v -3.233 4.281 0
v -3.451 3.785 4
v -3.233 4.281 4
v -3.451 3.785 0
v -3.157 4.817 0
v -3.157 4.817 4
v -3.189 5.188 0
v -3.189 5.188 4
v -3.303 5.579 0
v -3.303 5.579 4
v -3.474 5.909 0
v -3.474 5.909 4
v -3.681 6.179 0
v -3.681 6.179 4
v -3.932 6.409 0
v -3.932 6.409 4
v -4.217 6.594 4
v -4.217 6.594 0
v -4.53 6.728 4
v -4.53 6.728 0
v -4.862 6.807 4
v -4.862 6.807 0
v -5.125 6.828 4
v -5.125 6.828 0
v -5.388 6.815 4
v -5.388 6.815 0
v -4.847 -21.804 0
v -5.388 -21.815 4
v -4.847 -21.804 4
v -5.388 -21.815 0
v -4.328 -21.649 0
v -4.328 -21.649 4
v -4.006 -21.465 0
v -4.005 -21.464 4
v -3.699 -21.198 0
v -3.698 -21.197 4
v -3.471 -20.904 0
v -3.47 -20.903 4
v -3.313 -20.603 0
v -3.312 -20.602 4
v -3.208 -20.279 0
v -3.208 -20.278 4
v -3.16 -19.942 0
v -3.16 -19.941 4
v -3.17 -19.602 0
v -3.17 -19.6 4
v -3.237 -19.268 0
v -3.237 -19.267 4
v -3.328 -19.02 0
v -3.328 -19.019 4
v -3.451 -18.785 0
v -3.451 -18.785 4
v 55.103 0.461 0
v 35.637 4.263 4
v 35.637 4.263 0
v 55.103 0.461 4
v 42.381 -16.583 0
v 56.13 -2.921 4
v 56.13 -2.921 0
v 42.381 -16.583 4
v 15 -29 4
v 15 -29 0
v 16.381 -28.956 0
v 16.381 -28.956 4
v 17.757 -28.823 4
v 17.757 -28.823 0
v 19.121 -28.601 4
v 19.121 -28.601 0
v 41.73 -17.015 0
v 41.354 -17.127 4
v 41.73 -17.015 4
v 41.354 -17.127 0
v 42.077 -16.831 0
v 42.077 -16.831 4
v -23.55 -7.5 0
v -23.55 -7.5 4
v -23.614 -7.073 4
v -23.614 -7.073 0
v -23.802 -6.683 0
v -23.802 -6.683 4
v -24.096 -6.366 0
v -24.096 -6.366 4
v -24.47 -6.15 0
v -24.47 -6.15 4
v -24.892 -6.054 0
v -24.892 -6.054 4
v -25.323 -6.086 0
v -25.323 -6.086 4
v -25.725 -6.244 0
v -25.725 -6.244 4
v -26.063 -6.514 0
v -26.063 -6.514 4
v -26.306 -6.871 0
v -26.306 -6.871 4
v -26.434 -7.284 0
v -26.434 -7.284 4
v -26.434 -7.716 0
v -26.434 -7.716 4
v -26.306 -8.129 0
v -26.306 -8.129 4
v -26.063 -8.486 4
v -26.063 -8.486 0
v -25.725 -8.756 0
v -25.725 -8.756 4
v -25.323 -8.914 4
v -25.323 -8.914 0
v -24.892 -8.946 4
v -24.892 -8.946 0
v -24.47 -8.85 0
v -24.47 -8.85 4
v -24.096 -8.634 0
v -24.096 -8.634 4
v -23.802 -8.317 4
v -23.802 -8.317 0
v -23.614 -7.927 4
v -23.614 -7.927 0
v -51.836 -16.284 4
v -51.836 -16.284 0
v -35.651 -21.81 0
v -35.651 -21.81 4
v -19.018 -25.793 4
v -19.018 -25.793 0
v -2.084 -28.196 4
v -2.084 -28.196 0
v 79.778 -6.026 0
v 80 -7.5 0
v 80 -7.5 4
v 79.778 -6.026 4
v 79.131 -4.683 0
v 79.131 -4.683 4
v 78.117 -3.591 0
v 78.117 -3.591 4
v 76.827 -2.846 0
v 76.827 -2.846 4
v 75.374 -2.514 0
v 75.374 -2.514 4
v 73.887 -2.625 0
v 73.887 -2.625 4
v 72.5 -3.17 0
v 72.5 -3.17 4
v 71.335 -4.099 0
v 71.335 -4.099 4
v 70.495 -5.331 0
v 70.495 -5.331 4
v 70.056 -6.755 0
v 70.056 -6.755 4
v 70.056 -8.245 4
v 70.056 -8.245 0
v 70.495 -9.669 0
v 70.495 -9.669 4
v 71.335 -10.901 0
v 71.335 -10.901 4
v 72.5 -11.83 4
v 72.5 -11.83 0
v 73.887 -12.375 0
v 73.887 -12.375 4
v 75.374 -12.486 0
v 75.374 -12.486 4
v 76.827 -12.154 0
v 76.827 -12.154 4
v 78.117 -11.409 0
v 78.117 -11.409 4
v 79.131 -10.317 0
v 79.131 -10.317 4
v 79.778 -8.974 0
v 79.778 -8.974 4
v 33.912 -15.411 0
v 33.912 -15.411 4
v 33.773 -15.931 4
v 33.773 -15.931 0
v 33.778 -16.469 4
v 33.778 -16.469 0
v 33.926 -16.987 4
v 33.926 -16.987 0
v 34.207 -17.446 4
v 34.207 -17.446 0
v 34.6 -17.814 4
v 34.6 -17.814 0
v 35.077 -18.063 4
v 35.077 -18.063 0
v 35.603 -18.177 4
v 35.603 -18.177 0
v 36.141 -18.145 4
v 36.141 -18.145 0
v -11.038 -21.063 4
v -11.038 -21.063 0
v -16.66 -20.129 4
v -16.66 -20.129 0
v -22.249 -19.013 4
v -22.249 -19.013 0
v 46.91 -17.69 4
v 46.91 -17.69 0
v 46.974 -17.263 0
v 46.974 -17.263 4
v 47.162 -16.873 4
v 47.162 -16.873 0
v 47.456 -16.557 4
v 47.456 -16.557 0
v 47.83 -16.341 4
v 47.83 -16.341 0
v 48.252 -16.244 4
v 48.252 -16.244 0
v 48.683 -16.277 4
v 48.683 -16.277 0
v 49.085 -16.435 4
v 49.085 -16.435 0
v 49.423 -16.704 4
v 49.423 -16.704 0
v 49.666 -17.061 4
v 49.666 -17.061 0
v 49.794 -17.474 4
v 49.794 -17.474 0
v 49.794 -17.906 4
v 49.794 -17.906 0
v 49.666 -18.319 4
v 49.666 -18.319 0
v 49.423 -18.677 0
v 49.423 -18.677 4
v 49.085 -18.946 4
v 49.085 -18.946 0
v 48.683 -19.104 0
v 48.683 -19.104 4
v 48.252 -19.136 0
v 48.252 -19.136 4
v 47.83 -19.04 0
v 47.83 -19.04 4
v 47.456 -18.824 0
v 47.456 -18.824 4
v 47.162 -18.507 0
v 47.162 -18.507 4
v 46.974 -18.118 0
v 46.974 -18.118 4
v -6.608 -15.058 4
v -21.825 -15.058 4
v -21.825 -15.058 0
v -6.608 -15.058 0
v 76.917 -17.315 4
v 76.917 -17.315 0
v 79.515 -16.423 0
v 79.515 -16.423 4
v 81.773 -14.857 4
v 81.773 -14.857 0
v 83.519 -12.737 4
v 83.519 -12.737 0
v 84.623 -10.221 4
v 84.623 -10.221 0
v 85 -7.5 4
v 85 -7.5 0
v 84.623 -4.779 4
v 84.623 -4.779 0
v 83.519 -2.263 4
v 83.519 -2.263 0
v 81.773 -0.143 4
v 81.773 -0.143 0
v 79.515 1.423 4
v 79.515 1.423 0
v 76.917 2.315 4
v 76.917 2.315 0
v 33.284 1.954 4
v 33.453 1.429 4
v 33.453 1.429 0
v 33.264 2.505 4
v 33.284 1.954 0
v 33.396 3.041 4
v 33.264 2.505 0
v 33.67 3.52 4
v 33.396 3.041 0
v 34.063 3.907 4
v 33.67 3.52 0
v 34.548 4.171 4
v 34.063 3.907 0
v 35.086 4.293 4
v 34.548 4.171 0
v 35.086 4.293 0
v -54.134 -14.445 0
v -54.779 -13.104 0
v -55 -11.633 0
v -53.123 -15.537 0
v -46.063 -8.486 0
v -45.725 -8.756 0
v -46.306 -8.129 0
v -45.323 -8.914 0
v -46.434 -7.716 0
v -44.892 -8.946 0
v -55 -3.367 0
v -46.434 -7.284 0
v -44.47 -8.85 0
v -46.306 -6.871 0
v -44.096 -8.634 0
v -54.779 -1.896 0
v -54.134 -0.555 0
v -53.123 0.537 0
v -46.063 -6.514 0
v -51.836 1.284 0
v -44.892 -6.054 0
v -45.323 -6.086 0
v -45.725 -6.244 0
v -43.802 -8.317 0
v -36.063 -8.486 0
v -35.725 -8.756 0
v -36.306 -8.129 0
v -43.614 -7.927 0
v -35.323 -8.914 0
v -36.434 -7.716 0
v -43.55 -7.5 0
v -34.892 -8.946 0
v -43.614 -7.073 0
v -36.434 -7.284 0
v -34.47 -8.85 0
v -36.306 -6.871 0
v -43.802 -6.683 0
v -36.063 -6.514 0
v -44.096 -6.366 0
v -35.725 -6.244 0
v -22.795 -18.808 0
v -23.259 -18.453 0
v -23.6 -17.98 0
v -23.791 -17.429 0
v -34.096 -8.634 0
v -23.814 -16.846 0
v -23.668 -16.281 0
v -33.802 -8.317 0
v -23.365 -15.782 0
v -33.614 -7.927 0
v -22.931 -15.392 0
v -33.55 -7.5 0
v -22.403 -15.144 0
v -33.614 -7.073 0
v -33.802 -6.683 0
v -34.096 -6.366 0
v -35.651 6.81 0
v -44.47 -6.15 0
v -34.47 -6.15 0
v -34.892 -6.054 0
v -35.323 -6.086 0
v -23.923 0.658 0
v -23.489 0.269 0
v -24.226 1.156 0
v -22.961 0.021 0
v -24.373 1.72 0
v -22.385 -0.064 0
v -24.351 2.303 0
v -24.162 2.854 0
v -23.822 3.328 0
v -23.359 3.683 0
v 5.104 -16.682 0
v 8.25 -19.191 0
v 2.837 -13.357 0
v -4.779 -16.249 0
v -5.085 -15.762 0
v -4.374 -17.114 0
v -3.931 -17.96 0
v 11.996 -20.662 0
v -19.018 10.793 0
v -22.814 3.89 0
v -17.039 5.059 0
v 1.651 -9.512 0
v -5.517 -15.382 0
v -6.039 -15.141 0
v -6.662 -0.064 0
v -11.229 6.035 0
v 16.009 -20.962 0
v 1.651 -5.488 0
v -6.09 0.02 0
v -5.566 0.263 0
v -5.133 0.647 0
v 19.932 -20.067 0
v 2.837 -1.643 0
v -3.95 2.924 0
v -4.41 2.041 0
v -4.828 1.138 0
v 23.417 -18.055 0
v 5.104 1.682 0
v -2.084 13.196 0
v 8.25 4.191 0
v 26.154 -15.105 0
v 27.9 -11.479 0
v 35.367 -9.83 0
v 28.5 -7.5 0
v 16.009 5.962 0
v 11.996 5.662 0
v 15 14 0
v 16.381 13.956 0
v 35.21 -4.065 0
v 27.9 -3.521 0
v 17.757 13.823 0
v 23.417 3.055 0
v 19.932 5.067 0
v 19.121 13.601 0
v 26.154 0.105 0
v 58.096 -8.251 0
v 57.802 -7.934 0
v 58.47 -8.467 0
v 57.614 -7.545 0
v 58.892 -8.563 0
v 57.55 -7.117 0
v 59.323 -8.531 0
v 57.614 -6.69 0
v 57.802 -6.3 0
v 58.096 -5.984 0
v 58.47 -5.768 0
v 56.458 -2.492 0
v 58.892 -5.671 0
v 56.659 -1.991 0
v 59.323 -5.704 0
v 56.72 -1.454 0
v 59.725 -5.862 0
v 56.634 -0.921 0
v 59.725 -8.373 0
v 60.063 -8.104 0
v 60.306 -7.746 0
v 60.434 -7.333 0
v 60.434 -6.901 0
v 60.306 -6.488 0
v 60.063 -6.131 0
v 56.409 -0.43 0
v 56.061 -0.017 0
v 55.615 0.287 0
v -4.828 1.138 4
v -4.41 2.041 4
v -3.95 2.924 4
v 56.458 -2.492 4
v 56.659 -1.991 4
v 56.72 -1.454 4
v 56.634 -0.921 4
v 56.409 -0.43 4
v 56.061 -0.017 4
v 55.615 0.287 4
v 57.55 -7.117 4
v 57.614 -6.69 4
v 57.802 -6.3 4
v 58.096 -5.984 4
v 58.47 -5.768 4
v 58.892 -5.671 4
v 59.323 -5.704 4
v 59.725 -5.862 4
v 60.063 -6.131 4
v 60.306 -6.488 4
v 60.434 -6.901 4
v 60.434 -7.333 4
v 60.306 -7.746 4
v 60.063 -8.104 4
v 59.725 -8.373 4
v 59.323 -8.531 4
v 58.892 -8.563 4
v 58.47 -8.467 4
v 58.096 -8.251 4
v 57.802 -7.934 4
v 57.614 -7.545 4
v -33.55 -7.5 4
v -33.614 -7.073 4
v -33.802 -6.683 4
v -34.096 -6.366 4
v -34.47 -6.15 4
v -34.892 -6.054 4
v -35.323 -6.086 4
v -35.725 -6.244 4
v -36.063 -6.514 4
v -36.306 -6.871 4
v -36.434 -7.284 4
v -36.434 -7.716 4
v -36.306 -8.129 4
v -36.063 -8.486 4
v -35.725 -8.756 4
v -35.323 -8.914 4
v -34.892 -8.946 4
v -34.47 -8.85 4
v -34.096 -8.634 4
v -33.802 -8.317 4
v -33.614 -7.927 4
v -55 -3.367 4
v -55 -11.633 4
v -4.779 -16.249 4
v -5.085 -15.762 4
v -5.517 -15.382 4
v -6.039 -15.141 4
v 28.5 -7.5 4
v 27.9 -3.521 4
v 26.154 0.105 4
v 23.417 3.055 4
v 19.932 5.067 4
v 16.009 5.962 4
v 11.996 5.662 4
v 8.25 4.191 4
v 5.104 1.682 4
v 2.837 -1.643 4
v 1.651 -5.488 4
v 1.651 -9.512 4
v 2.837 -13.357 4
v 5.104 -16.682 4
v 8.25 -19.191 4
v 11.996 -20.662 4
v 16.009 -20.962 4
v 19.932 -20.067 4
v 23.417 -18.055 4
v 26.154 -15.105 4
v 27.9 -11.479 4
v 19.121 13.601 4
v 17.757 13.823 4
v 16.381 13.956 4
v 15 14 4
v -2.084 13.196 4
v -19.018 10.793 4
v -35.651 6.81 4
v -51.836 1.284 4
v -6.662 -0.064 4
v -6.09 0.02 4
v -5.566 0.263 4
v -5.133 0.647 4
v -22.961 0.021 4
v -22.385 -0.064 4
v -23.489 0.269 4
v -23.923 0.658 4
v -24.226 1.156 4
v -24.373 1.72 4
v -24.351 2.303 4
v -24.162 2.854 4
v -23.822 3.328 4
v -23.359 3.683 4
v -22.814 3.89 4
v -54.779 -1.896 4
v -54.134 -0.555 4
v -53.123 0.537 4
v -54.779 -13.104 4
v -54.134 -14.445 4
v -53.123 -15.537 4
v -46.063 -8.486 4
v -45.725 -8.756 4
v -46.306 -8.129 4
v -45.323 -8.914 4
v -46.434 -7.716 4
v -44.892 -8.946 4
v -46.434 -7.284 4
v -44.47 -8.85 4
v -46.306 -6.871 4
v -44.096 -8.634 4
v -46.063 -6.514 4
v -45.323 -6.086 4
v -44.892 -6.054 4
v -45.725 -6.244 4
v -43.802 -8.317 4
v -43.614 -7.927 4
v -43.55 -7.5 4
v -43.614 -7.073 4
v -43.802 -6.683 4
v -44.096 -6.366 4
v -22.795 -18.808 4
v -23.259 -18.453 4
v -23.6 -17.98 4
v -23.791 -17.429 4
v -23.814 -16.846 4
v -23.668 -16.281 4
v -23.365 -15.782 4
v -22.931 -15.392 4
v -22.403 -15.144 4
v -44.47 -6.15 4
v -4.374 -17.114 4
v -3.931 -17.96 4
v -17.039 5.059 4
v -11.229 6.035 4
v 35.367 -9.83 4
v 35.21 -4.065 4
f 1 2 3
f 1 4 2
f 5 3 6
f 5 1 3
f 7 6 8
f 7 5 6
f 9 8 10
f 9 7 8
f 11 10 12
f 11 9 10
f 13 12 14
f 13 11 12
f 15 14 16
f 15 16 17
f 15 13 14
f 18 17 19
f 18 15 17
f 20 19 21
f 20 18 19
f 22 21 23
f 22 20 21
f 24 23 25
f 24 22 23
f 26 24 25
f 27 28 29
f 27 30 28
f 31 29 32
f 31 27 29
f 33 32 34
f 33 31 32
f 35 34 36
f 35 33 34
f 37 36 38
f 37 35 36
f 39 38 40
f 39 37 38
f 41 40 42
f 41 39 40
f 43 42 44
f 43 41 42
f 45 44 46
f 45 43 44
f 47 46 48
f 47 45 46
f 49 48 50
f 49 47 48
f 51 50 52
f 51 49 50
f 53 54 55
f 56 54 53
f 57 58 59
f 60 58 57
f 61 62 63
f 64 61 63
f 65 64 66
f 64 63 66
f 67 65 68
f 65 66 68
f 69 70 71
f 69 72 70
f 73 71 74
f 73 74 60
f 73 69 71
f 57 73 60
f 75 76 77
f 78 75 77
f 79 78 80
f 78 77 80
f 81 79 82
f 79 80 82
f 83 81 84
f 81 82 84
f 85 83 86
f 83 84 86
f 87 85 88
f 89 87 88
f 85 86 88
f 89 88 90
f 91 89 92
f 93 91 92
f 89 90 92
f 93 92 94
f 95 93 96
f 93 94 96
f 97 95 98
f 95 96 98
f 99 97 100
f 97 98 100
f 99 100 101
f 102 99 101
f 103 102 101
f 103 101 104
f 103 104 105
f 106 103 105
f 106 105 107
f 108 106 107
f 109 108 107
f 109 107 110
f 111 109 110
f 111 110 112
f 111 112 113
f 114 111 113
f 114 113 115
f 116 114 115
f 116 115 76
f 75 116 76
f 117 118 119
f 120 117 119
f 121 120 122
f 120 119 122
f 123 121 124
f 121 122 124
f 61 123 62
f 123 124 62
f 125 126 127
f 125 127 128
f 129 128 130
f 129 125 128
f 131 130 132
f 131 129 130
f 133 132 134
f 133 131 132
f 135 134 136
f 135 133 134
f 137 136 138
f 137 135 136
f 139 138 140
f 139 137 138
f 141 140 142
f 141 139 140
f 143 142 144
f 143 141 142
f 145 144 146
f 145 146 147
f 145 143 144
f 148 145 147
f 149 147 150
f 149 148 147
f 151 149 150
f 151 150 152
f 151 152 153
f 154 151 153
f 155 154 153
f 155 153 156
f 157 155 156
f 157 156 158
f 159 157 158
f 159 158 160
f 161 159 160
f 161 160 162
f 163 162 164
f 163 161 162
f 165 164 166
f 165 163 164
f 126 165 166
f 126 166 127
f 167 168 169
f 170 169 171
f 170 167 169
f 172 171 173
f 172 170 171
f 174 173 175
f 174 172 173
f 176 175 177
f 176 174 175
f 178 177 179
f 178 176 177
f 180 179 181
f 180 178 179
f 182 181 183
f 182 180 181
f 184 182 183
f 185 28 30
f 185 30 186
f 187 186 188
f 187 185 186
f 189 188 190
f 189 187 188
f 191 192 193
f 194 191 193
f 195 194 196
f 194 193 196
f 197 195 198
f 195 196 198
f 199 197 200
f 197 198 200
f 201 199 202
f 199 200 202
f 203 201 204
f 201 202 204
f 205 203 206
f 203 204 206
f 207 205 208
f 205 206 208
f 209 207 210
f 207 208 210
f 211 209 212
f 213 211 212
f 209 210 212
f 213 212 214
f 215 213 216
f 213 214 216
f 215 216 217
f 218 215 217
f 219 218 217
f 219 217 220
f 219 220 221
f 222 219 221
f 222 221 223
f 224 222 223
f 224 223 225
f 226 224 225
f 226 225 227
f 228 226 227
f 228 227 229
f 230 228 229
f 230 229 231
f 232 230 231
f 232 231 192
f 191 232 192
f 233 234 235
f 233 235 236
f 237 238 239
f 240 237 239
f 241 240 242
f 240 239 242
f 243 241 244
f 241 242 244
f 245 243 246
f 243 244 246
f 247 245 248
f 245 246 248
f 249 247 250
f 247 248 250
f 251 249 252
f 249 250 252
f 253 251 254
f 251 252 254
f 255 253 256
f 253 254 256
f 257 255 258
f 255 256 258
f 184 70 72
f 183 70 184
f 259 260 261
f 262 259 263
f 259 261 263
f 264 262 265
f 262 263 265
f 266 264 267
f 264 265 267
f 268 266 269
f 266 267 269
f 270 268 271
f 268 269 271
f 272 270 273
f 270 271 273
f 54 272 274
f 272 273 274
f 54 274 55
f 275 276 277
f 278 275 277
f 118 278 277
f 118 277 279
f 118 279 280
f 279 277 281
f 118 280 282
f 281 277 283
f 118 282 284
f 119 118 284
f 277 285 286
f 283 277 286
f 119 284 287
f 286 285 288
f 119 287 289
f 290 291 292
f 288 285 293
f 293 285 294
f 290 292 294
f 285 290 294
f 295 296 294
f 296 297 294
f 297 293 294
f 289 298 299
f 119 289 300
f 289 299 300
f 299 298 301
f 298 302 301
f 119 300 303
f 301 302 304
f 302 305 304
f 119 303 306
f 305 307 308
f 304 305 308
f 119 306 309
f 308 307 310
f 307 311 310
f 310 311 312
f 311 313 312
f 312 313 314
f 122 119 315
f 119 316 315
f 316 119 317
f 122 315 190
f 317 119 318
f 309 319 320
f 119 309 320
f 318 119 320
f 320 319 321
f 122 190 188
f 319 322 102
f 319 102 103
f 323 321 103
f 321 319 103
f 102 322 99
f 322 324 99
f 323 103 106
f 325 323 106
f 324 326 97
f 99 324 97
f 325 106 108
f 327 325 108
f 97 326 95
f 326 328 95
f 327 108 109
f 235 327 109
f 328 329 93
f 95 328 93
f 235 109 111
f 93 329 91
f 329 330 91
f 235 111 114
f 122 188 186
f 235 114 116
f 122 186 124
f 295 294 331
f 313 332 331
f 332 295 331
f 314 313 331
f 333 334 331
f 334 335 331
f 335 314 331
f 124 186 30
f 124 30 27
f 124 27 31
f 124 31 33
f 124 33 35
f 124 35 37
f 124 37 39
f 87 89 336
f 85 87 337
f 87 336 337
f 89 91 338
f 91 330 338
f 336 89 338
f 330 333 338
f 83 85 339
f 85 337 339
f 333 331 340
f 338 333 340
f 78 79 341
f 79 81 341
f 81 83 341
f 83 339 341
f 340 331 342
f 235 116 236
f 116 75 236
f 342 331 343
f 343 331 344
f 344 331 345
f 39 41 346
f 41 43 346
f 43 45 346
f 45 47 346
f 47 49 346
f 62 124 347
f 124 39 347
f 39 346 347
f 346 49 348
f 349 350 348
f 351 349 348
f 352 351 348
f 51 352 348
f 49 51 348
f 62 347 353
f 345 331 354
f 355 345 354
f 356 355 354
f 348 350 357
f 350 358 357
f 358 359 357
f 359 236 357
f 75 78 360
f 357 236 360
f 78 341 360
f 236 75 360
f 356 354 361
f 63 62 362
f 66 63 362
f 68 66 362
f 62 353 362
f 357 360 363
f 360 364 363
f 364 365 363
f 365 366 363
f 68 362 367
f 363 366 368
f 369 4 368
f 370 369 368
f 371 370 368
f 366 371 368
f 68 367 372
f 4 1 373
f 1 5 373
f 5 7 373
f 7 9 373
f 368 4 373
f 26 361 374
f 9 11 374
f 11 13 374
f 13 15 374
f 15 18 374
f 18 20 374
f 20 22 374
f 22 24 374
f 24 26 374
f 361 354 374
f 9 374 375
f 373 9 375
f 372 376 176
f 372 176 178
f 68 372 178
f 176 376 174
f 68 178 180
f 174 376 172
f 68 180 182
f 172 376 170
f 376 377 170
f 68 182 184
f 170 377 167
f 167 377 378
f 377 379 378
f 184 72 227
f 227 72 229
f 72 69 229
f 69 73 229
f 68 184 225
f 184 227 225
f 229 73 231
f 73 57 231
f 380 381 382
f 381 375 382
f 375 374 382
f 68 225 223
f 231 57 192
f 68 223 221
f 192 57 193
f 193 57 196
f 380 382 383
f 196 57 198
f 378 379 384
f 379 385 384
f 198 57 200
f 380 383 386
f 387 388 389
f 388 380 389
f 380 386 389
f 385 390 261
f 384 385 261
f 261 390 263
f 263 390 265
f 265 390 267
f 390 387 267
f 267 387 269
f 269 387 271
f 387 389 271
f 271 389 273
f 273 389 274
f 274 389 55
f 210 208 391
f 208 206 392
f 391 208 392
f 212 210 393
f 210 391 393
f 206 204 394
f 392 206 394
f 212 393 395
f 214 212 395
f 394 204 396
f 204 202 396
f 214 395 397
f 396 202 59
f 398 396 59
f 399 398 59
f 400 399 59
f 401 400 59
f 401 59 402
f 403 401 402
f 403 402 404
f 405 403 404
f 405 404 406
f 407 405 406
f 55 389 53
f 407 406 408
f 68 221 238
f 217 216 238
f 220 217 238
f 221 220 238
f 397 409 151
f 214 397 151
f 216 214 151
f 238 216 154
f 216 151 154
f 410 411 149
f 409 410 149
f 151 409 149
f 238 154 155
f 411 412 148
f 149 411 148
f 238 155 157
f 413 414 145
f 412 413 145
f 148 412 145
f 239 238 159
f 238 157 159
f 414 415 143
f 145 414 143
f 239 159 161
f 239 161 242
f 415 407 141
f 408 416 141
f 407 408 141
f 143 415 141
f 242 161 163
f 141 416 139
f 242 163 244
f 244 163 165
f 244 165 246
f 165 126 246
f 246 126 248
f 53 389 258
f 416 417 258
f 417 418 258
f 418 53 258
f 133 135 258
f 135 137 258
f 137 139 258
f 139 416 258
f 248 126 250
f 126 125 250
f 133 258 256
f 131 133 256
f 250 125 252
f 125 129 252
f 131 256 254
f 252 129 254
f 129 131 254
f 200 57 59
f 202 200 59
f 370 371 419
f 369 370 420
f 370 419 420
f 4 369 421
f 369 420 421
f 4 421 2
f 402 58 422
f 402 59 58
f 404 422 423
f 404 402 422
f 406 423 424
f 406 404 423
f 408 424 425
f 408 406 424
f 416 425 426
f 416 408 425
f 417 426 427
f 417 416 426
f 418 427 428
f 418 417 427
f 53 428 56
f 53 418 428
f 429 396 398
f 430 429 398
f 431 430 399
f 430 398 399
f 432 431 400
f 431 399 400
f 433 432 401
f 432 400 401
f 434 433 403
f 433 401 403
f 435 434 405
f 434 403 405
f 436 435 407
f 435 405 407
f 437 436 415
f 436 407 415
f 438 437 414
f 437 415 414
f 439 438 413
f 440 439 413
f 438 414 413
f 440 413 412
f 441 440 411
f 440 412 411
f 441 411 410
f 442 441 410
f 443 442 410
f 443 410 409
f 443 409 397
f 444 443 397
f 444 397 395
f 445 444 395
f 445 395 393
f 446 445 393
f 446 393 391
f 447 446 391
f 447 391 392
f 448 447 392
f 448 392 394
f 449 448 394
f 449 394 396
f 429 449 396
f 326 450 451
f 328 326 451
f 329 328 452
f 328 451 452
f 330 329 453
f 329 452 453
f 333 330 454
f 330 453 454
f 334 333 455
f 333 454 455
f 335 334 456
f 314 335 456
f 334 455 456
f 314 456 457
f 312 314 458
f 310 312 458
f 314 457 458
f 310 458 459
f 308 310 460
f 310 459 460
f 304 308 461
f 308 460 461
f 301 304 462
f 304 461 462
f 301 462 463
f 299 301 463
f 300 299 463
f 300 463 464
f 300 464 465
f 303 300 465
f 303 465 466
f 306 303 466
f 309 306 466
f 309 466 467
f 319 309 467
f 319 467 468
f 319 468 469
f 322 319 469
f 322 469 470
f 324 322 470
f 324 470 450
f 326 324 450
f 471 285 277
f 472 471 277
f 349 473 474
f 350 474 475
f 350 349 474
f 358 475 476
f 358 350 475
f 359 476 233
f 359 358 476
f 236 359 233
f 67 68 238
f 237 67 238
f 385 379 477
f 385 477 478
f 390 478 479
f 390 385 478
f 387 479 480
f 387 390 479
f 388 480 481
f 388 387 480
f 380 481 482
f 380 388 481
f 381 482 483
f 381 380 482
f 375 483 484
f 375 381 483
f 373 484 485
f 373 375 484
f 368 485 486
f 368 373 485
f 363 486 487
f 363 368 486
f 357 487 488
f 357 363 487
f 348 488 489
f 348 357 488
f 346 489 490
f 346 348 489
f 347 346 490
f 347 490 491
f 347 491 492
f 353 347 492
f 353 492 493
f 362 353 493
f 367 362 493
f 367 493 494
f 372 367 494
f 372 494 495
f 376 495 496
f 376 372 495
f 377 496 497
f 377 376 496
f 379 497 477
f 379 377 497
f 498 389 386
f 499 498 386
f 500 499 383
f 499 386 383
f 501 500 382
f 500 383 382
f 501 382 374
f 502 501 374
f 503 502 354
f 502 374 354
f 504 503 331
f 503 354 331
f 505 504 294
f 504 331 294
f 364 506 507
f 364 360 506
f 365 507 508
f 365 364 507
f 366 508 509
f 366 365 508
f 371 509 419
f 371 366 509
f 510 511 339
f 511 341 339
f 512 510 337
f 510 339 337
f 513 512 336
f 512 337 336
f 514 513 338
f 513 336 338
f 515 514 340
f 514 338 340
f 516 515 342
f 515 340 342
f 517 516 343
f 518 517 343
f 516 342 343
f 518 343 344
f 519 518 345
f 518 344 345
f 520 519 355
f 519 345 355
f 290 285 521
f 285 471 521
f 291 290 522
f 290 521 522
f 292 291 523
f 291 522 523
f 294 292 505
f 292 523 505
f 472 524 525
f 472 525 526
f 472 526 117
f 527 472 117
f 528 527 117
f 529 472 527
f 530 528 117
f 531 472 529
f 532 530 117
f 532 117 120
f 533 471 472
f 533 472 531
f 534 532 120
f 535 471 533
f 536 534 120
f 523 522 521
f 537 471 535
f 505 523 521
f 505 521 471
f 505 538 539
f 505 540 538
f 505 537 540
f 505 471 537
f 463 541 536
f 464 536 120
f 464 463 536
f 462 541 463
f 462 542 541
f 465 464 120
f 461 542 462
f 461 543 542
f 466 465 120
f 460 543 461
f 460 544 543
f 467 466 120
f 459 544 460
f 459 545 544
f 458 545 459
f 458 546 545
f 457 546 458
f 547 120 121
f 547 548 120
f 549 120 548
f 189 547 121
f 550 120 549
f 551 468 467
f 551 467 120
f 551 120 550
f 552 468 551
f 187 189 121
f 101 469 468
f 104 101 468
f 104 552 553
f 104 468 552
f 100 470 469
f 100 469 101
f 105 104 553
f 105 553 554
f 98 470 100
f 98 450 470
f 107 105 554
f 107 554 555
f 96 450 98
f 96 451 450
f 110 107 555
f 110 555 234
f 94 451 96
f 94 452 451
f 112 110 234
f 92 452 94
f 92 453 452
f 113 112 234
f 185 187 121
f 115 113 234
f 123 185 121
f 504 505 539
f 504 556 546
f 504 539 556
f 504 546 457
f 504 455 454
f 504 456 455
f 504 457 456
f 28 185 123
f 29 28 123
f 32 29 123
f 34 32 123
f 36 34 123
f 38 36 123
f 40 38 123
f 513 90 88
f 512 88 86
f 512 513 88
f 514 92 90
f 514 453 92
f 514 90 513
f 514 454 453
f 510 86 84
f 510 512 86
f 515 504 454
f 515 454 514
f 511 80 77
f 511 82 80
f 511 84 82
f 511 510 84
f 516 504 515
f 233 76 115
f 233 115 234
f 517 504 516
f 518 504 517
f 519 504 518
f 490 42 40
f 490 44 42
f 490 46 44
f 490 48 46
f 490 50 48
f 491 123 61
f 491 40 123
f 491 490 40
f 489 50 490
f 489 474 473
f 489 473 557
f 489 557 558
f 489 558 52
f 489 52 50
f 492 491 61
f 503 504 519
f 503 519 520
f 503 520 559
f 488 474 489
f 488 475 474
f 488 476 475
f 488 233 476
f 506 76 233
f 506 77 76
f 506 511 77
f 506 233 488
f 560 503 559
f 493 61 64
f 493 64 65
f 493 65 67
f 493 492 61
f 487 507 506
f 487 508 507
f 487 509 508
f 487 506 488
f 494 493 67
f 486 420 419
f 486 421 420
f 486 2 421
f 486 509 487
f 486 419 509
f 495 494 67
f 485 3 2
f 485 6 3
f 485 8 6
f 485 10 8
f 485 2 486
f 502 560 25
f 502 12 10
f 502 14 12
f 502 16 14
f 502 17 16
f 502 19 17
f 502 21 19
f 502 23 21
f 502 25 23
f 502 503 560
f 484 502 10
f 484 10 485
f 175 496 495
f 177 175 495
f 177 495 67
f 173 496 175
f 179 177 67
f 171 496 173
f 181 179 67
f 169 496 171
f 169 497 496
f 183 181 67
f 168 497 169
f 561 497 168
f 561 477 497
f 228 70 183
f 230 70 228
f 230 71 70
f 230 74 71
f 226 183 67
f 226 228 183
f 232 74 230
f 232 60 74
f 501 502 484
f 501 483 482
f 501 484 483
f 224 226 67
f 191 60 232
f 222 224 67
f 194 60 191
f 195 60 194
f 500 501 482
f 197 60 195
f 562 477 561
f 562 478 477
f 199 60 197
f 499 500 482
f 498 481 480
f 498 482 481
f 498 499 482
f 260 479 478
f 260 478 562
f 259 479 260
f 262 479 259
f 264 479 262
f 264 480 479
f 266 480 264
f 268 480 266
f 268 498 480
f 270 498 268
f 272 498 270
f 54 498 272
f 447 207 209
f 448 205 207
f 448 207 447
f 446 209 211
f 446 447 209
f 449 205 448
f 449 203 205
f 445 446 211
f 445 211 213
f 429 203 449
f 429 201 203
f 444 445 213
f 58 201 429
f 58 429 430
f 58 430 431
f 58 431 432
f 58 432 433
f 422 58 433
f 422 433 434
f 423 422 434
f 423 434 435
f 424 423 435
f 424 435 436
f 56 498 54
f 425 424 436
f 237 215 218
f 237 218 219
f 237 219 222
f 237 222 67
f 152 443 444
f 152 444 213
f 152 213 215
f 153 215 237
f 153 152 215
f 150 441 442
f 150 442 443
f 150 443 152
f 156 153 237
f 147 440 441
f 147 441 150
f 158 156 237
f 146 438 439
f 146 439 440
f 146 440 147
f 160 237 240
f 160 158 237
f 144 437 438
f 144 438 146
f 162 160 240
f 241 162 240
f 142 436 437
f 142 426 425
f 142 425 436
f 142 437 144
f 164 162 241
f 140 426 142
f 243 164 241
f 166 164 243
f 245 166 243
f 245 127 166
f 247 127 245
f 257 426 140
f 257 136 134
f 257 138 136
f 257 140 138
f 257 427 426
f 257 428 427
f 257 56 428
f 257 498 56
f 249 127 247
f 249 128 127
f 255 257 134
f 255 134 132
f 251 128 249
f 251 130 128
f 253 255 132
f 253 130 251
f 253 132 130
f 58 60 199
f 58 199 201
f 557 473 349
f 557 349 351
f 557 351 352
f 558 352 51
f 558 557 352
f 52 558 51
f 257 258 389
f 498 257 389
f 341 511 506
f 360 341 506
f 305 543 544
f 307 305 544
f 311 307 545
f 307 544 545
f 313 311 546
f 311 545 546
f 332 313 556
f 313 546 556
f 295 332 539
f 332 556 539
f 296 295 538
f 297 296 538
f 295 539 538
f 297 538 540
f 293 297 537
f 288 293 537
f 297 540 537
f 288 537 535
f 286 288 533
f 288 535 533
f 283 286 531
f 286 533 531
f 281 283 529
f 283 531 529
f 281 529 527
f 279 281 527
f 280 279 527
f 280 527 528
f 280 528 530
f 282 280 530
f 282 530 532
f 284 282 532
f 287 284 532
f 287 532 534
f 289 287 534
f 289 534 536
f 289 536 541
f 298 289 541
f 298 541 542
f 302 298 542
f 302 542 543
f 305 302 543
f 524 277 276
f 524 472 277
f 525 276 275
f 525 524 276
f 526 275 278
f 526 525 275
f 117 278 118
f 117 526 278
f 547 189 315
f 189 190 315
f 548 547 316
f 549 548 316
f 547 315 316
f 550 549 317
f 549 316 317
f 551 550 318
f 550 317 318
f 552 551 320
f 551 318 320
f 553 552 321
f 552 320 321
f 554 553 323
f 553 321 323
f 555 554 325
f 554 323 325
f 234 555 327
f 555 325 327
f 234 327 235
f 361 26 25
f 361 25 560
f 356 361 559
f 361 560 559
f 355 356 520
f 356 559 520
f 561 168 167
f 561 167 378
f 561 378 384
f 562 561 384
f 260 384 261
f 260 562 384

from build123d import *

# Parameters (mm, degrees)
SKETCH_1_R          = 13.5
SKETCH_1_R_2        = 5
EXTRUDE_1_DEPTH     = 4
SKETCH_2_R          = 1.45
CUT_EXTRUDE_1_DEPTH = 90.899944383
SKETCH_4_R          = 1.45
CUT_EXTRUDE_3_DEPTH = 90.899944383
FILLET_4_R          = 5
CUT_EXTRUDE_4_DEPTH = 90.899944383
FILLET_5_R          = 2


with BuildPart() as part:
    # 草图1 → 凸台-拉伸1 (new body)
    with BuildSketch(Plane.XY):
        with BuildLine():
            Line((-55, 0), (-55, -15))
            ThreePointArc((-55, -15), (-20.693136595, -25.465682976), (15, -29))
            ThreePointArc((15, -29), (17.07003357, -28.900115911), (19.120833333, -28.601391723))
            Line((19.120833333, -28.601391723), (76.916666667, -17.314600801))
            ThreePointArc((76.916666667, -17.314600801), (85, -7.5), (76.916666667, 2.314600801))
            Line((76.916666667, 2.314600801), (19.120833333, 13.601391723))
            ThreePointArc((19.120833333, 13.601391723), (17.07003357, 13.900115911), (15, 14))
            ThreePointArc((15, 14), (-20.693136595, 10.465682976), (-55, 0))
        make_face()
        with Locations((15, -7.5)):
            Circle(SKETCH_1_R, mode=Mode.SUBTRACT)
        with Locations((75, -7.5)):
            Circle(SKETCH_1_R_2, mode=Mode.SUBTRACT)
    extrude(amount=EXTRUDE_1_DEPTH)

    # 草图2 → 切除-拉伸1 (cut, through all)
    with BuildSketch(Plane.XY.offset(4)):
        with Locations((-45, -7.5)):
            Circle(SKETCH_2_R)
        with Locations((-35, -7.5)):
            Circle(SKETCH_2_R)
        with Locations((-25, -7.5)):
            Circle(SKETCH_2_R)
    extrude(amount=-CUT_EXTRUDE_1_DEPTH, mode=Mode.SUBTRACT)

    # 草图4 → 切除-拉伸3 (cut, through all)
    with BuildSketch(Plane(origin=(0, 0, 0), x_dir=(-1, 0, 0), z_dir=(0, 0, -1))):
        with Locations((-59, -7.117300414)):
            Circle(SKETCH_4_R)
        with Locations((-48.359904235, -17.69030198)):
            Circle(SKETCH_4_R)
    extrude(amount=-CUT_EXTRUDE_3_DEPTH, mode=Mode.SUBTRACT)

    # 圆角4
    fillet_4_edges = [part.edges().sort_by_distance(p)[0] for p in [
        (-55, -15, 2),
        (-55, 0, 2),
    ]]
    fillet(fillet_4_edges, radius=FILLET_4_R)

    # 草图5 → 切除-拉伸4 (cut, through all)
    with BuildSketch(Plane.XY.offset(4)):
        with BuildLine():
            Line((-37.662714363, -0.06358788), (-5.309418997, -0.06358788))
            ThreePointArc((-5.309418997, -0.06358788), (-3.415372639, 3.842256204), (-0.779510023, 7.291206463))
            ThreePointArc((-0.779510023, 7.291206463), (-19.418131409, 4.60183148), (-37.662714363, -0.06358788))
        make_face()
        with BuildLine():
            Line((-37.271815743, -15.058493623), (-5.264301107, -15.058493623))
            ThreePointArc((-5.264301107, -15.058493623), (-3.381161932, -18.897614279), (-0.779510023, -22.291206463))
            ThreePointArc((-0.779510023, -22.291206463), (-19.217302179, -19.641756918), (-37.271815743, -15.058493623))
        make_face()
        with BuildLine():
            Line((31.138502072, 5.141153068), (58.805420584, -0.261844115))
            Line((58.805420584, -0.261844115), (41.950078957, -17.010899515))
            Line((41.950078957, -17.010899515), (32.001874449, -18.953657286))
            ThreePointArc((32.001874449, -18.953657286), (35.486852137, -6.765909049), (31.138502072, 5.141153068))
        make_face()
    extrude(amount=-CUT_EXTRUDE_4_DEPTH, mode=Mode.SUBTRACT)

    # 圆角5
    fillet_5_edges = [part.edges().sort_by_distance(p)[0] for p in [
        (32.001874449, -18.953657286, 2),
        (31.138502072, 5.141153068, 2),
        (58.805420584, -0.261844115, 2),
        (41.950078957, -17.010899515, 2),
        (-37.662714363, -0.06358788, 2),
        (-0.779510023, 7.291206463, 2),
        (-5.309418997, -0.06358788, 2),
        (-0.779510023, -22.291206463, 2),
        (-37.271815743, -15.058493623, 2),
        (-5.264301107, -15.058493623, 2),
    ]]
    fillet(fillet_5_edges, radius=FILLET_5_R)


solid = part.part
